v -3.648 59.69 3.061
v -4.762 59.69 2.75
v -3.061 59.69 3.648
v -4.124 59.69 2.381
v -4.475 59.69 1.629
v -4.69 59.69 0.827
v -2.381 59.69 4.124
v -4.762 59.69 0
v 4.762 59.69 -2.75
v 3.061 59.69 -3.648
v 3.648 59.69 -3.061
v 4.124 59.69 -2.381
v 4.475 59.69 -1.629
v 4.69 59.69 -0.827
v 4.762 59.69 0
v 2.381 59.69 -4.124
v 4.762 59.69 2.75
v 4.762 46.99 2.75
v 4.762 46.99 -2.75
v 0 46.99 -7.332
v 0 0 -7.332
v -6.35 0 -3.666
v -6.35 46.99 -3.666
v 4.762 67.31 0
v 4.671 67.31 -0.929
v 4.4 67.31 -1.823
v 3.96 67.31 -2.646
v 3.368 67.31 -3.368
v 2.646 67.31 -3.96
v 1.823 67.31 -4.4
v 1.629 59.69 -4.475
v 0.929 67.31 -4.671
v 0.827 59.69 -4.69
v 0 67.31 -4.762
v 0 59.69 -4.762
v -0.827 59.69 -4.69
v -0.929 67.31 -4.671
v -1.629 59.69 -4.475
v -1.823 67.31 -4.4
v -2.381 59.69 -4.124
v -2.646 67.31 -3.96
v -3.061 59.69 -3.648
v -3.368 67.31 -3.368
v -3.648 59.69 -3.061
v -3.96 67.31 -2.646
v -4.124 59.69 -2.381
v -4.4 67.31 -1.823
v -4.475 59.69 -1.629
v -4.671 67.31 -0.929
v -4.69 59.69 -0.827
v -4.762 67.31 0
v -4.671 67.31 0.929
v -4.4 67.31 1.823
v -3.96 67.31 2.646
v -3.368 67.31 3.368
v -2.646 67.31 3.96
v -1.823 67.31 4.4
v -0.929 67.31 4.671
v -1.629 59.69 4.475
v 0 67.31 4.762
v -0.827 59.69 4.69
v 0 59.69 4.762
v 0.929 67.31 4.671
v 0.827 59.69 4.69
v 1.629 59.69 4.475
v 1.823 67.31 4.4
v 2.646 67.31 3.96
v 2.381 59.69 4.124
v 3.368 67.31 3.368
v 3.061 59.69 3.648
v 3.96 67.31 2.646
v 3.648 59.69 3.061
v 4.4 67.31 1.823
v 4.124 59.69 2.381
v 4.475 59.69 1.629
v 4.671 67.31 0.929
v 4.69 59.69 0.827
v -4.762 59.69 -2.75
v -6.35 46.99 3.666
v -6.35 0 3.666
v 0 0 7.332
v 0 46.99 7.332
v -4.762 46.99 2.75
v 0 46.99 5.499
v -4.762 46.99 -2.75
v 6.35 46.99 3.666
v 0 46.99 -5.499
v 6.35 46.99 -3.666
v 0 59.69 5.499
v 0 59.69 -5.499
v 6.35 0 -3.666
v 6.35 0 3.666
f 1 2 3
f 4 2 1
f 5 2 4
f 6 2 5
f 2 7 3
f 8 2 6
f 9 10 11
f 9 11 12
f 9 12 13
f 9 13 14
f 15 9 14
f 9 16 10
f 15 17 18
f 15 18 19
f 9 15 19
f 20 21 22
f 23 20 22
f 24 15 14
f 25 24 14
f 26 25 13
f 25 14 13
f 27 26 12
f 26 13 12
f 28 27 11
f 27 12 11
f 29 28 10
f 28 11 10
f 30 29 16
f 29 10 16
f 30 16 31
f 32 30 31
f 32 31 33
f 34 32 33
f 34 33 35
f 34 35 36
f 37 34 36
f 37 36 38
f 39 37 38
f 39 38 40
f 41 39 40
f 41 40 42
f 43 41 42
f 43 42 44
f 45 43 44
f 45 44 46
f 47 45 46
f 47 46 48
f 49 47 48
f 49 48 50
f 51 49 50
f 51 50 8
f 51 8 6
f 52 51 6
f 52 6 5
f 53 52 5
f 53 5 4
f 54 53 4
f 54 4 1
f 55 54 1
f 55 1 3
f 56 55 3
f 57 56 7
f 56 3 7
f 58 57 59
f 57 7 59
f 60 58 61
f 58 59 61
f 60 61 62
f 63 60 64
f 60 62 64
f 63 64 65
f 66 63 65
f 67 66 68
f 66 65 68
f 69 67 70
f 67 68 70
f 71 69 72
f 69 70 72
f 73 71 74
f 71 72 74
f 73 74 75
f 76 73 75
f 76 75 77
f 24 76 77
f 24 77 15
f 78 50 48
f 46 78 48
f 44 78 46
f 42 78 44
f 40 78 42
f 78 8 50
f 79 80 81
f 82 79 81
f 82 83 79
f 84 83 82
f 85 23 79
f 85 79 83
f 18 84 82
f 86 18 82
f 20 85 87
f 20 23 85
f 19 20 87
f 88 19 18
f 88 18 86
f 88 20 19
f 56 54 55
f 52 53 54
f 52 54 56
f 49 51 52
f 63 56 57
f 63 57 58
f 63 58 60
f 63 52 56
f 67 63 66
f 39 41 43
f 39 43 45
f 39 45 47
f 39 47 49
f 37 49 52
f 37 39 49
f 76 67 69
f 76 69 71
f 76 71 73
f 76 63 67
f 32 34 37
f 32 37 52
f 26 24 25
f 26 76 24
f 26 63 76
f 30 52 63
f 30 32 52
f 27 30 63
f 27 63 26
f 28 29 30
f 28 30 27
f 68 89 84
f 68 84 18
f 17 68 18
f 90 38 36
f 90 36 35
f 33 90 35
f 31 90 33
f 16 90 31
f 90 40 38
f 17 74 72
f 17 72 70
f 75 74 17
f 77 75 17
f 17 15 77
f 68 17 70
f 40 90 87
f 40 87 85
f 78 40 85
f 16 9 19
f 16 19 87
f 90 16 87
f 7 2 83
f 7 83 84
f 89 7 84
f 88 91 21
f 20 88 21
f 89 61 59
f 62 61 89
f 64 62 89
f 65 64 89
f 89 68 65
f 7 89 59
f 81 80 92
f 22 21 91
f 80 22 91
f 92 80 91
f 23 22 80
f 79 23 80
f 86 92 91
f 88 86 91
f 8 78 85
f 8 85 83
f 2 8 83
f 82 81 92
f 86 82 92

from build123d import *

# Parameters (mm, degrees)
BOSS_EXTRUDE1_DEPTH = 59.69
SKETCH2_R           = 4.7625
BOSS_EXTRUDE2_DEPTH = 67.31
CUT_EXTRUDE1_DEPTH  = 12.7


with BuildPart() as part:
    # Sketch1 → Boss-Extrude1 (new body)
    with BuildSketch(Plane(origin=(0, 0, 0), x_dir=(1, 0, 0), z_dir=(0, 1, 0))):
        Polygon((6.35, -3.666174209), (6.35, 3.666174209), (0, 7.332348419), (-6.35, 3.666174209), (-6.35, -3.666174209), (0, -7.332348419), align=None)
    extrude(amount=BOSS_EXTRUDE1_DEPTH)

    # Sketch2 → Boss-Extrude2 (add)
    with BuildSketch(Plane(origin=(0, 0, 0), x_dir=(1, 0, 0), z_dir=(0, 1, 0))):
        Circle(SKETCH2_R)
    extrude(amount=BOSS_EXTRUDE2_DEPTH)

    # Sketch3 → Cut-Extrude1 (cut)
    with BuildSketch(Plane(origin=(0, 59.69, 0), x_dir=(1, 0, 0), z_dir=(0, 1, 0))):
        Polygon((0, -7.332348419), (6.35, -3.666174209), (6.35, 3.666174209), (0, 7.332348419), (-6.35, 3.666174209), (-6.35, -3.666174209), align=None)
        Polygon((4.7625, -2.749630657), (4.7625, 2.749630657), (0, 5.499261314), (-4.7625, 2.749630657), (-4.7625, -2.749630657), (0, -5.499261314), align=None, mode=Mode.SUBTRACT)
    extrude(amount=-CUT_EXTRUDE1_DEPTH, mode=Mode.SUBTRACT)


solid = part.part
